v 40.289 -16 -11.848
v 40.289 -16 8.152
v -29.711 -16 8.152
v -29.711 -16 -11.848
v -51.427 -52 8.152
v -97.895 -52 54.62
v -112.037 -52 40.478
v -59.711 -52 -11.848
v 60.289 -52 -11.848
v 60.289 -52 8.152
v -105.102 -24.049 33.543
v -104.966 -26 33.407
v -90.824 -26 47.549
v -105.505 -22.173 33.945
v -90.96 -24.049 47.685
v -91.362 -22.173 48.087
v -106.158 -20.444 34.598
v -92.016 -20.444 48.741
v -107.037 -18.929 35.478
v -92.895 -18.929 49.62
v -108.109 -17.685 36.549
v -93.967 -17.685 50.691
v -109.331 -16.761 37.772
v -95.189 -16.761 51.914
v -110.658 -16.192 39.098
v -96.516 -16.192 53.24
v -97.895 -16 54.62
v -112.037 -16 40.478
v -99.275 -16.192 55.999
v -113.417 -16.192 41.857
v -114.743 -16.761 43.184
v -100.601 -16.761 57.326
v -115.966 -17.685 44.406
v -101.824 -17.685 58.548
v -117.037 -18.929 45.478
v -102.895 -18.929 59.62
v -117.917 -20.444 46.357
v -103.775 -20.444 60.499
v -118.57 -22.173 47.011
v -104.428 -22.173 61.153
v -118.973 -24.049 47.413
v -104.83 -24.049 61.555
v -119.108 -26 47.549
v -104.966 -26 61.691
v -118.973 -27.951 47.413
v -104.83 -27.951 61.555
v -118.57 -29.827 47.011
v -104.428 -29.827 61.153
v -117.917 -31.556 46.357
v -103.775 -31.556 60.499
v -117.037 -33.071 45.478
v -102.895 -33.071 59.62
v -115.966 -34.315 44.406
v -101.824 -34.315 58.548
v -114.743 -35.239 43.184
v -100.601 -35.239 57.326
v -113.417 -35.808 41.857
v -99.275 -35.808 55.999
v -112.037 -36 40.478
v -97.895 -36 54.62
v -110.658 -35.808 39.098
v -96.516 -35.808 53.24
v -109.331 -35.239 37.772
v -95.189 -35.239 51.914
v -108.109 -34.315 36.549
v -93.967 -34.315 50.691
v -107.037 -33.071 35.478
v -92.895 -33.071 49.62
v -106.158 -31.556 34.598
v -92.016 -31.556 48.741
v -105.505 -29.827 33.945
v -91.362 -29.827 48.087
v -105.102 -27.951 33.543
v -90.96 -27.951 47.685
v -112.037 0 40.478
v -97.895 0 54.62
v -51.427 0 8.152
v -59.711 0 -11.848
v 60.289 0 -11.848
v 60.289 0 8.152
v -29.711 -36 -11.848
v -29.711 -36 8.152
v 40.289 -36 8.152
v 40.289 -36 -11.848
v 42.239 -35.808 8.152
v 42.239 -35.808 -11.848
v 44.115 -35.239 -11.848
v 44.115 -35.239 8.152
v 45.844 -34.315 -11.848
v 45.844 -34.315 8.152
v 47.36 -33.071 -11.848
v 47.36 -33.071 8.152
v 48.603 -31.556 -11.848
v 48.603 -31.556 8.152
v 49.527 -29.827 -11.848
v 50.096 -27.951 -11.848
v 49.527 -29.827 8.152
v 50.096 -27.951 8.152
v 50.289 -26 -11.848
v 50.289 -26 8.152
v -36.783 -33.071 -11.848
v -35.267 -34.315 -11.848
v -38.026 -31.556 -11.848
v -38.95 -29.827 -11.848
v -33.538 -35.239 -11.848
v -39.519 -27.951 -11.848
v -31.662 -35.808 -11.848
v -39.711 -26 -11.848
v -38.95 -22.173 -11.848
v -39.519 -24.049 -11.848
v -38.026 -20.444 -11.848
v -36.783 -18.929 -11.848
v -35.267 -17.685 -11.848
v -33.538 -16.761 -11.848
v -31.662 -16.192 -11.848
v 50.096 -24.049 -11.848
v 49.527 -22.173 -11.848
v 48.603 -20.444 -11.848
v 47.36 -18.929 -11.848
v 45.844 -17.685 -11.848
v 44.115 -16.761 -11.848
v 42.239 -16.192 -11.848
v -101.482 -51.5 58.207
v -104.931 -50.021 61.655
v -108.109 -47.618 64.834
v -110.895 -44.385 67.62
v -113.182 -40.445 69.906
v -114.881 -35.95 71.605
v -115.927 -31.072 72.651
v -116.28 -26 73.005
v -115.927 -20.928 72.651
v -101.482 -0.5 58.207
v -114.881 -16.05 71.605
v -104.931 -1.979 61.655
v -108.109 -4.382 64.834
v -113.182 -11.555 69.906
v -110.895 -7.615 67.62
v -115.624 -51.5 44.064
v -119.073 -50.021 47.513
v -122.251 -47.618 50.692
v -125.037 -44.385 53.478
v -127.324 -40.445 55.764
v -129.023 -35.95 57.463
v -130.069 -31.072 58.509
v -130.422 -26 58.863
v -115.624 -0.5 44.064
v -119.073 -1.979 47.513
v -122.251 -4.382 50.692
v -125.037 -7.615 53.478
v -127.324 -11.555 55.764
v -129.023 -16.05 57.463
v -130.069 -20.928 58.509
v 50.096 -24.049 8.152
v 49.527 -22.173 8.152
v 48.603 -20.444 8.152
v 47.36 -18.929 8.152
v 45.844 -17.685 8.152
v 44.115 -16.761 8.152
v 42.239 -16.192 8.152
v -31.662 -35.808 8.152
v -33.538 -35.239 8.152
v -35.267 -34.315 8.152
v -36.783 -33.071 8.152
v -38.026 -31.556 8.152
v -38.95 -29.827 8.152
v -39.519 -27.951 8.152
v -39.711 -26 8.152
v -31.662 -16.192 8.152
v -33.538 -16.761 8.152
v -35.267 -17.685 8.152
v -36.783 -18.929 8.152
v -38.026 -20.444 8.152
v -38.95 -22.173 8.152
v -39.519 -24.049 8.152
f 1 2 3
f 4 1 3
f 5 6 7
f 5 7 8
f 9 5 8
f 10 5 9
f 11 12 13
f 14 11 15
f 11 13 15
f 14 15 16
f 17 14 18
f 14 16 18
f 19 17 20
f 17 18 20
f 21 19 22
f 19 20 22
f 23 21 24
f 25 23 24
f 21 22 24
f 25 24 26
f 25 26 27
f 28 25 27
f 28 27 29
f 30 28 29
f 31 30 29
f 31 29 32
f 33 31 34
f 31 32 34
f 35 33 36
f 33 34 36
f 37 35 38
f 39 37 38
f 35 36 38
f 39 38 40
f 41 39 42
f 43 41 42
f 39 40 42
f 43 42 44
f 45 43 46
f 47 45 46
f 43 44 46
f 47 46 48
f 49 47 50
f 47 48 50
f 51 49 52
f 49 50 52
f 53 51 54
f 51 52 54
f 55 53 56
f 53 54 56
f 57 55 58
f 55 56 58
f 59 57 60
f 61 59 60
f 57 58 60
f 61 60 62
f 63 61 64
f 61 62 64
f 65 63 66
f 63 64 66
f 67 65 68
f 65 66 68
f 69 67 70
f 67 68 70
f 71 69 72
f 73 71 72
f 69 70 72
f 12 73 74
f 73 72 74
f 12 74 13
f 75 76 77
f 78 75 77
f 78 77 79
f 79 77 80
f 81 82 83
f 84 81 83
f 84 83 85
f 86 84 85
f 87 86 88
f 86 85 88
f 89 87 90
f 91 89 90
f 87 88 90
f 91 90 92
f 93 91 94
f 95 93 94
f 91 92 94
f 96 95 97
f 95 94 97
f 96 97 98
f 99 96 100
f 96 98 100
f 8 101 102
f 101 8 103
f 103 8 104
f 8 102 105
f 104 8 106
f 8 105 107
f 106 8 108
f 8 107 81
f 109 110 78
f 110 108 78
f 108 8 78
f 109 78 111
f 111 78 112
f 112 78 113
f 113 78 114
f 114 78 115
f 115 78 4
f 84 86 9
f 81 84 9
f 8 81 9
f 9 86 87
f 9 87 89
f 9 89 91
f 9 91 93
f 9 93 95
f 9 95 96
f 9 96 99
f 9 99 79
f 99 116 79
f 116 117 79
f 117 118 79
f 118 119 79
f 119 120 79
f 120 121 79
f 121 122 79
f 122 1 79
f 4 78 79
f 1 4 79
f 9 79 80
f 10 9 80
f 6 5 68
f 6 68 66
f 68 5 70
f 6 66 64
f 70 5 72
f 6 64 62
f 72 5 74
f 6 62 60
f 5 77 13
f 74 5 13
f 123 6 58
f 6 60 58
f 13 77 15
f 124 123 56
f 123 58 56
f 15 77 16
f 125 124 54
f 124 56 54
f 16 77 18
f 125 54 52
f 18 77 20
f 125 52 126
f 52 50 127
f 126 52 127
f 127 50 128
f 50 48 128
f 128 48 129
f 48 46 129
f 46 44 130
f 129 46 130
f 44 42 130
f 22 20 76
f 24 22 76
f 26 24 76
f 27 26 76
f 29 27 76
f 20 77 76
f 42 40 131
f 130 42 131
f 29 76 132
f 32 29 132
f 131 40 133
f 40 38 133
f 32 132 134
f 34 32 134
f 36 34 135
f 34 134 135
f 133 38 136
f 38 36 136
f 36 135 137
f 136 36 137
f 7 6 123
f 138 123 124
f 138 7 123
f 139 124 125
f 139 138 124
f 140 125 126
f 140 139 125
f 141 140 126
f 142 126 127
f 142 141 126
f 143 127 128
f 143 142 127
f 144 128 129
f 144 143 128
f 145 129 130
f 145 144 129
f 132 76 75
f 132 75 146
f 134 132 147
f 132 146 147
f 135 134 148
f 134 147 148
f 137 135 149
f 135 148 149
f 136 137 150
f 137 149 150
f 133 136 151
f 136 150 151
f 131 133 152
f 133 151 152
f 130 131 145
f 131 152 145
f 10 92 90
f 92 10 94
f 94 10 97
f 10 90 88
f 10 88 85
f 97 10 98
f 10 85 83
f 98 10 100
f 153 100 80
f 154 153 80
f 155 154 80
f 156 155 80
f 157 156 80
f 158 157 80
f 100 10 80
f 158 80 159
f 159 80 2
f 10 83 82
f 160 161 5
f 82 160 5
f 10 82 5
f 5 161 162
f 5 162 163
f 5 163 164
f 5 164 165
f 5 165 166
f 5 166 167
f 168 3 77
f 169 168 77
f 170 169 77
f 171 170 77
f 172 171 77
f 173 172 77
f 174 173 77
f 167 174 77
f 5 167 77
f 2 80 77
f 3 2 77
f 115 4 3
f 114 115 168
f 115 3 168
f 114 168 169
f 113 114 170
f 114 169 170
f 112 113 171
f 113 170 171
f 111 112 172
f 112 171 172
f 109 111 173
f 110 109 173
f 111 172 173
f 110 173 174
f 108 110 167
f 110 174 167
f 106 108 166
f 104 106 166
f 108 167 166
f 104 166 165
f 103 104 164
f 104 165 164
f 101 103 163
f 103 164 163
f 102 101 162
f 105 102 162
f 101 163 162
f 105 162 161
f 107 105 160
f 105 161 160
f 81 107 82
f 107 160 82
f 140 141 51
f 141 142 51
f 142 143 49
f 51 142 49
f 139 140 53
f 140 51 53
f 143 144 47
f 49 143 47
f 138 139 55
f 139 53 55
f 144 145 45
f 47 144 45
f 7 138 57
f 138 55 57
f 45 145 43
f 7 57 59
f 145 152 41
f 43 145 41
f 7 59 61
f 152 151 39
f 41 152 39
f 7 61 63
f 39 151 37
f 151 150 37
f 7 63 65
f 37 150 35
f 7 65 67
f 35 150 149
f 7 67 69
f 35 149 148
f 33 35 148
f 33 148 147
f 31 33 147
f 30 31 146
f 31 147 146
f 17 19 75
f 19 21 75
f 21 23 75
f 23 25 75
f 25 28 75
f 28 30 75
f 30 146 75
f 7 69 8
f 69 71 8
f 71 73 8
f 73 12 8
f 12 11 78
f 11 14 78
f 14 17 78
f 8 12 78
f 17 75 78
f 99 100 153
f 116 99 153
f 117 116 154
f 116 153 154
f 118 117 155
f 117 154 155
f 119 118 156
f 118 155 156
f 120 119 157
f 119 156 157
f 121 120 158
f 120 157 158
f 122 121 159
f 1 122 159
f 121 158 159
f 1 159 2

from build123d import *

# Parameters (mm, degrees)
F1_DEPTH = 52
F2_R     = 10
F3_DEPTH = 20
F5_DEPTH = 20
F6_R     = 25.99999


# Not quite as in the source:
# - a fillet or chamfer is up to 0.001 mm smaller than in the source, because OpenCascade refuses the exact size


with BuildPart() as f1:
    # F0 (on Front) → F1 (new body)
    with BuildSketch(Plane.XZ):
        Polygon((60.2885049582, -11.8481526151), (60.2885049582, 8.1518473849), (-51.4272237944, 8.1518473849), (-116.2800375368, 73.0046611273), (-130.4221731605, 58.8625255035), (-59.7114950418, -11.8481526151), align=None)
    extrude(amount=F1_DEPTH)

    # F2 (on face) → F3 (cut)
    with BuildSketch(Plane(origin=(-21.6376882048, 0, -21.6376882048), x_dir=(0.7071067812, 0, -0.7071067812), z_dir=(0.7071067812, 0, 0.7071067812))):
        with Locations((-107.8444940002, -26)):
            Circle(F2_R)
    extrude(amount=-F3_DEPTH, mode=Mode.SUBTRACT)

    # F4 (on face) → F5 (cut)
    with BuildSketch(Plane.XY.offset(8.1518473849)):
        with BuildLine():
            ThreePointArc((40.2885049582, -36), (47.35957277, -33.0710678119), (50.2885049582, -26))
            ThreePointArc((50.2885049582, -26), (47.35957277, -18.9289321881), (40.2885049582, -16))
            ThreePointArc((40.2885049582, -16), (30.2885049582, -26), (40.2885049582, -36))
        make_face()
        with BuildLine():
            ThreePointArc((40.2885049582, -36), (30.2885049582, -26), (40.2885049582, -16))
            Line((40.2885049582, -16), (-29.7114950418, -16))
            ThreePointArc((-29.7114950418, -16), (-22.64042723, -18.9289321881), (-19.7114950418, -26))
            ThreePointArc((-19.7114950418, -26), (-22.64042723, -33.0710678119), (-29.7114950418, -36))
            Line((-29.7114950418, -36), (40.2885049582, -36))
        make_face()
        with BuildLine():
            ThreePointArc((-19.7114950418, -26), (-22.64042723, -18.9289321881), (-29.7114950418, -16))
            ThreePointArc((-29.7114950418, -16), (-39.7114950418, -26), (-29.7114950418, -36))
            ThreePointArc((-29.7114950418, -36), (-22.64042723, -33.0710678119), (-19.7114950418, -26))
        make_face()
    extrude(amount=-F5_DEPTH, mode=Mode.SUBTRACT)

    # F6 (radius 26 in the source; OpenCascade refuses exactly that, so slightly less here)
    f6_edges = [f1.edges().sort_by_distance(p)[0] for p in [
        (-123.351105, -52, 65.933593),
        (-123.351105, 0, 65.933593),
    ]]
    fillet(f6_edges, radius=F6_R)


solid = f1.part
